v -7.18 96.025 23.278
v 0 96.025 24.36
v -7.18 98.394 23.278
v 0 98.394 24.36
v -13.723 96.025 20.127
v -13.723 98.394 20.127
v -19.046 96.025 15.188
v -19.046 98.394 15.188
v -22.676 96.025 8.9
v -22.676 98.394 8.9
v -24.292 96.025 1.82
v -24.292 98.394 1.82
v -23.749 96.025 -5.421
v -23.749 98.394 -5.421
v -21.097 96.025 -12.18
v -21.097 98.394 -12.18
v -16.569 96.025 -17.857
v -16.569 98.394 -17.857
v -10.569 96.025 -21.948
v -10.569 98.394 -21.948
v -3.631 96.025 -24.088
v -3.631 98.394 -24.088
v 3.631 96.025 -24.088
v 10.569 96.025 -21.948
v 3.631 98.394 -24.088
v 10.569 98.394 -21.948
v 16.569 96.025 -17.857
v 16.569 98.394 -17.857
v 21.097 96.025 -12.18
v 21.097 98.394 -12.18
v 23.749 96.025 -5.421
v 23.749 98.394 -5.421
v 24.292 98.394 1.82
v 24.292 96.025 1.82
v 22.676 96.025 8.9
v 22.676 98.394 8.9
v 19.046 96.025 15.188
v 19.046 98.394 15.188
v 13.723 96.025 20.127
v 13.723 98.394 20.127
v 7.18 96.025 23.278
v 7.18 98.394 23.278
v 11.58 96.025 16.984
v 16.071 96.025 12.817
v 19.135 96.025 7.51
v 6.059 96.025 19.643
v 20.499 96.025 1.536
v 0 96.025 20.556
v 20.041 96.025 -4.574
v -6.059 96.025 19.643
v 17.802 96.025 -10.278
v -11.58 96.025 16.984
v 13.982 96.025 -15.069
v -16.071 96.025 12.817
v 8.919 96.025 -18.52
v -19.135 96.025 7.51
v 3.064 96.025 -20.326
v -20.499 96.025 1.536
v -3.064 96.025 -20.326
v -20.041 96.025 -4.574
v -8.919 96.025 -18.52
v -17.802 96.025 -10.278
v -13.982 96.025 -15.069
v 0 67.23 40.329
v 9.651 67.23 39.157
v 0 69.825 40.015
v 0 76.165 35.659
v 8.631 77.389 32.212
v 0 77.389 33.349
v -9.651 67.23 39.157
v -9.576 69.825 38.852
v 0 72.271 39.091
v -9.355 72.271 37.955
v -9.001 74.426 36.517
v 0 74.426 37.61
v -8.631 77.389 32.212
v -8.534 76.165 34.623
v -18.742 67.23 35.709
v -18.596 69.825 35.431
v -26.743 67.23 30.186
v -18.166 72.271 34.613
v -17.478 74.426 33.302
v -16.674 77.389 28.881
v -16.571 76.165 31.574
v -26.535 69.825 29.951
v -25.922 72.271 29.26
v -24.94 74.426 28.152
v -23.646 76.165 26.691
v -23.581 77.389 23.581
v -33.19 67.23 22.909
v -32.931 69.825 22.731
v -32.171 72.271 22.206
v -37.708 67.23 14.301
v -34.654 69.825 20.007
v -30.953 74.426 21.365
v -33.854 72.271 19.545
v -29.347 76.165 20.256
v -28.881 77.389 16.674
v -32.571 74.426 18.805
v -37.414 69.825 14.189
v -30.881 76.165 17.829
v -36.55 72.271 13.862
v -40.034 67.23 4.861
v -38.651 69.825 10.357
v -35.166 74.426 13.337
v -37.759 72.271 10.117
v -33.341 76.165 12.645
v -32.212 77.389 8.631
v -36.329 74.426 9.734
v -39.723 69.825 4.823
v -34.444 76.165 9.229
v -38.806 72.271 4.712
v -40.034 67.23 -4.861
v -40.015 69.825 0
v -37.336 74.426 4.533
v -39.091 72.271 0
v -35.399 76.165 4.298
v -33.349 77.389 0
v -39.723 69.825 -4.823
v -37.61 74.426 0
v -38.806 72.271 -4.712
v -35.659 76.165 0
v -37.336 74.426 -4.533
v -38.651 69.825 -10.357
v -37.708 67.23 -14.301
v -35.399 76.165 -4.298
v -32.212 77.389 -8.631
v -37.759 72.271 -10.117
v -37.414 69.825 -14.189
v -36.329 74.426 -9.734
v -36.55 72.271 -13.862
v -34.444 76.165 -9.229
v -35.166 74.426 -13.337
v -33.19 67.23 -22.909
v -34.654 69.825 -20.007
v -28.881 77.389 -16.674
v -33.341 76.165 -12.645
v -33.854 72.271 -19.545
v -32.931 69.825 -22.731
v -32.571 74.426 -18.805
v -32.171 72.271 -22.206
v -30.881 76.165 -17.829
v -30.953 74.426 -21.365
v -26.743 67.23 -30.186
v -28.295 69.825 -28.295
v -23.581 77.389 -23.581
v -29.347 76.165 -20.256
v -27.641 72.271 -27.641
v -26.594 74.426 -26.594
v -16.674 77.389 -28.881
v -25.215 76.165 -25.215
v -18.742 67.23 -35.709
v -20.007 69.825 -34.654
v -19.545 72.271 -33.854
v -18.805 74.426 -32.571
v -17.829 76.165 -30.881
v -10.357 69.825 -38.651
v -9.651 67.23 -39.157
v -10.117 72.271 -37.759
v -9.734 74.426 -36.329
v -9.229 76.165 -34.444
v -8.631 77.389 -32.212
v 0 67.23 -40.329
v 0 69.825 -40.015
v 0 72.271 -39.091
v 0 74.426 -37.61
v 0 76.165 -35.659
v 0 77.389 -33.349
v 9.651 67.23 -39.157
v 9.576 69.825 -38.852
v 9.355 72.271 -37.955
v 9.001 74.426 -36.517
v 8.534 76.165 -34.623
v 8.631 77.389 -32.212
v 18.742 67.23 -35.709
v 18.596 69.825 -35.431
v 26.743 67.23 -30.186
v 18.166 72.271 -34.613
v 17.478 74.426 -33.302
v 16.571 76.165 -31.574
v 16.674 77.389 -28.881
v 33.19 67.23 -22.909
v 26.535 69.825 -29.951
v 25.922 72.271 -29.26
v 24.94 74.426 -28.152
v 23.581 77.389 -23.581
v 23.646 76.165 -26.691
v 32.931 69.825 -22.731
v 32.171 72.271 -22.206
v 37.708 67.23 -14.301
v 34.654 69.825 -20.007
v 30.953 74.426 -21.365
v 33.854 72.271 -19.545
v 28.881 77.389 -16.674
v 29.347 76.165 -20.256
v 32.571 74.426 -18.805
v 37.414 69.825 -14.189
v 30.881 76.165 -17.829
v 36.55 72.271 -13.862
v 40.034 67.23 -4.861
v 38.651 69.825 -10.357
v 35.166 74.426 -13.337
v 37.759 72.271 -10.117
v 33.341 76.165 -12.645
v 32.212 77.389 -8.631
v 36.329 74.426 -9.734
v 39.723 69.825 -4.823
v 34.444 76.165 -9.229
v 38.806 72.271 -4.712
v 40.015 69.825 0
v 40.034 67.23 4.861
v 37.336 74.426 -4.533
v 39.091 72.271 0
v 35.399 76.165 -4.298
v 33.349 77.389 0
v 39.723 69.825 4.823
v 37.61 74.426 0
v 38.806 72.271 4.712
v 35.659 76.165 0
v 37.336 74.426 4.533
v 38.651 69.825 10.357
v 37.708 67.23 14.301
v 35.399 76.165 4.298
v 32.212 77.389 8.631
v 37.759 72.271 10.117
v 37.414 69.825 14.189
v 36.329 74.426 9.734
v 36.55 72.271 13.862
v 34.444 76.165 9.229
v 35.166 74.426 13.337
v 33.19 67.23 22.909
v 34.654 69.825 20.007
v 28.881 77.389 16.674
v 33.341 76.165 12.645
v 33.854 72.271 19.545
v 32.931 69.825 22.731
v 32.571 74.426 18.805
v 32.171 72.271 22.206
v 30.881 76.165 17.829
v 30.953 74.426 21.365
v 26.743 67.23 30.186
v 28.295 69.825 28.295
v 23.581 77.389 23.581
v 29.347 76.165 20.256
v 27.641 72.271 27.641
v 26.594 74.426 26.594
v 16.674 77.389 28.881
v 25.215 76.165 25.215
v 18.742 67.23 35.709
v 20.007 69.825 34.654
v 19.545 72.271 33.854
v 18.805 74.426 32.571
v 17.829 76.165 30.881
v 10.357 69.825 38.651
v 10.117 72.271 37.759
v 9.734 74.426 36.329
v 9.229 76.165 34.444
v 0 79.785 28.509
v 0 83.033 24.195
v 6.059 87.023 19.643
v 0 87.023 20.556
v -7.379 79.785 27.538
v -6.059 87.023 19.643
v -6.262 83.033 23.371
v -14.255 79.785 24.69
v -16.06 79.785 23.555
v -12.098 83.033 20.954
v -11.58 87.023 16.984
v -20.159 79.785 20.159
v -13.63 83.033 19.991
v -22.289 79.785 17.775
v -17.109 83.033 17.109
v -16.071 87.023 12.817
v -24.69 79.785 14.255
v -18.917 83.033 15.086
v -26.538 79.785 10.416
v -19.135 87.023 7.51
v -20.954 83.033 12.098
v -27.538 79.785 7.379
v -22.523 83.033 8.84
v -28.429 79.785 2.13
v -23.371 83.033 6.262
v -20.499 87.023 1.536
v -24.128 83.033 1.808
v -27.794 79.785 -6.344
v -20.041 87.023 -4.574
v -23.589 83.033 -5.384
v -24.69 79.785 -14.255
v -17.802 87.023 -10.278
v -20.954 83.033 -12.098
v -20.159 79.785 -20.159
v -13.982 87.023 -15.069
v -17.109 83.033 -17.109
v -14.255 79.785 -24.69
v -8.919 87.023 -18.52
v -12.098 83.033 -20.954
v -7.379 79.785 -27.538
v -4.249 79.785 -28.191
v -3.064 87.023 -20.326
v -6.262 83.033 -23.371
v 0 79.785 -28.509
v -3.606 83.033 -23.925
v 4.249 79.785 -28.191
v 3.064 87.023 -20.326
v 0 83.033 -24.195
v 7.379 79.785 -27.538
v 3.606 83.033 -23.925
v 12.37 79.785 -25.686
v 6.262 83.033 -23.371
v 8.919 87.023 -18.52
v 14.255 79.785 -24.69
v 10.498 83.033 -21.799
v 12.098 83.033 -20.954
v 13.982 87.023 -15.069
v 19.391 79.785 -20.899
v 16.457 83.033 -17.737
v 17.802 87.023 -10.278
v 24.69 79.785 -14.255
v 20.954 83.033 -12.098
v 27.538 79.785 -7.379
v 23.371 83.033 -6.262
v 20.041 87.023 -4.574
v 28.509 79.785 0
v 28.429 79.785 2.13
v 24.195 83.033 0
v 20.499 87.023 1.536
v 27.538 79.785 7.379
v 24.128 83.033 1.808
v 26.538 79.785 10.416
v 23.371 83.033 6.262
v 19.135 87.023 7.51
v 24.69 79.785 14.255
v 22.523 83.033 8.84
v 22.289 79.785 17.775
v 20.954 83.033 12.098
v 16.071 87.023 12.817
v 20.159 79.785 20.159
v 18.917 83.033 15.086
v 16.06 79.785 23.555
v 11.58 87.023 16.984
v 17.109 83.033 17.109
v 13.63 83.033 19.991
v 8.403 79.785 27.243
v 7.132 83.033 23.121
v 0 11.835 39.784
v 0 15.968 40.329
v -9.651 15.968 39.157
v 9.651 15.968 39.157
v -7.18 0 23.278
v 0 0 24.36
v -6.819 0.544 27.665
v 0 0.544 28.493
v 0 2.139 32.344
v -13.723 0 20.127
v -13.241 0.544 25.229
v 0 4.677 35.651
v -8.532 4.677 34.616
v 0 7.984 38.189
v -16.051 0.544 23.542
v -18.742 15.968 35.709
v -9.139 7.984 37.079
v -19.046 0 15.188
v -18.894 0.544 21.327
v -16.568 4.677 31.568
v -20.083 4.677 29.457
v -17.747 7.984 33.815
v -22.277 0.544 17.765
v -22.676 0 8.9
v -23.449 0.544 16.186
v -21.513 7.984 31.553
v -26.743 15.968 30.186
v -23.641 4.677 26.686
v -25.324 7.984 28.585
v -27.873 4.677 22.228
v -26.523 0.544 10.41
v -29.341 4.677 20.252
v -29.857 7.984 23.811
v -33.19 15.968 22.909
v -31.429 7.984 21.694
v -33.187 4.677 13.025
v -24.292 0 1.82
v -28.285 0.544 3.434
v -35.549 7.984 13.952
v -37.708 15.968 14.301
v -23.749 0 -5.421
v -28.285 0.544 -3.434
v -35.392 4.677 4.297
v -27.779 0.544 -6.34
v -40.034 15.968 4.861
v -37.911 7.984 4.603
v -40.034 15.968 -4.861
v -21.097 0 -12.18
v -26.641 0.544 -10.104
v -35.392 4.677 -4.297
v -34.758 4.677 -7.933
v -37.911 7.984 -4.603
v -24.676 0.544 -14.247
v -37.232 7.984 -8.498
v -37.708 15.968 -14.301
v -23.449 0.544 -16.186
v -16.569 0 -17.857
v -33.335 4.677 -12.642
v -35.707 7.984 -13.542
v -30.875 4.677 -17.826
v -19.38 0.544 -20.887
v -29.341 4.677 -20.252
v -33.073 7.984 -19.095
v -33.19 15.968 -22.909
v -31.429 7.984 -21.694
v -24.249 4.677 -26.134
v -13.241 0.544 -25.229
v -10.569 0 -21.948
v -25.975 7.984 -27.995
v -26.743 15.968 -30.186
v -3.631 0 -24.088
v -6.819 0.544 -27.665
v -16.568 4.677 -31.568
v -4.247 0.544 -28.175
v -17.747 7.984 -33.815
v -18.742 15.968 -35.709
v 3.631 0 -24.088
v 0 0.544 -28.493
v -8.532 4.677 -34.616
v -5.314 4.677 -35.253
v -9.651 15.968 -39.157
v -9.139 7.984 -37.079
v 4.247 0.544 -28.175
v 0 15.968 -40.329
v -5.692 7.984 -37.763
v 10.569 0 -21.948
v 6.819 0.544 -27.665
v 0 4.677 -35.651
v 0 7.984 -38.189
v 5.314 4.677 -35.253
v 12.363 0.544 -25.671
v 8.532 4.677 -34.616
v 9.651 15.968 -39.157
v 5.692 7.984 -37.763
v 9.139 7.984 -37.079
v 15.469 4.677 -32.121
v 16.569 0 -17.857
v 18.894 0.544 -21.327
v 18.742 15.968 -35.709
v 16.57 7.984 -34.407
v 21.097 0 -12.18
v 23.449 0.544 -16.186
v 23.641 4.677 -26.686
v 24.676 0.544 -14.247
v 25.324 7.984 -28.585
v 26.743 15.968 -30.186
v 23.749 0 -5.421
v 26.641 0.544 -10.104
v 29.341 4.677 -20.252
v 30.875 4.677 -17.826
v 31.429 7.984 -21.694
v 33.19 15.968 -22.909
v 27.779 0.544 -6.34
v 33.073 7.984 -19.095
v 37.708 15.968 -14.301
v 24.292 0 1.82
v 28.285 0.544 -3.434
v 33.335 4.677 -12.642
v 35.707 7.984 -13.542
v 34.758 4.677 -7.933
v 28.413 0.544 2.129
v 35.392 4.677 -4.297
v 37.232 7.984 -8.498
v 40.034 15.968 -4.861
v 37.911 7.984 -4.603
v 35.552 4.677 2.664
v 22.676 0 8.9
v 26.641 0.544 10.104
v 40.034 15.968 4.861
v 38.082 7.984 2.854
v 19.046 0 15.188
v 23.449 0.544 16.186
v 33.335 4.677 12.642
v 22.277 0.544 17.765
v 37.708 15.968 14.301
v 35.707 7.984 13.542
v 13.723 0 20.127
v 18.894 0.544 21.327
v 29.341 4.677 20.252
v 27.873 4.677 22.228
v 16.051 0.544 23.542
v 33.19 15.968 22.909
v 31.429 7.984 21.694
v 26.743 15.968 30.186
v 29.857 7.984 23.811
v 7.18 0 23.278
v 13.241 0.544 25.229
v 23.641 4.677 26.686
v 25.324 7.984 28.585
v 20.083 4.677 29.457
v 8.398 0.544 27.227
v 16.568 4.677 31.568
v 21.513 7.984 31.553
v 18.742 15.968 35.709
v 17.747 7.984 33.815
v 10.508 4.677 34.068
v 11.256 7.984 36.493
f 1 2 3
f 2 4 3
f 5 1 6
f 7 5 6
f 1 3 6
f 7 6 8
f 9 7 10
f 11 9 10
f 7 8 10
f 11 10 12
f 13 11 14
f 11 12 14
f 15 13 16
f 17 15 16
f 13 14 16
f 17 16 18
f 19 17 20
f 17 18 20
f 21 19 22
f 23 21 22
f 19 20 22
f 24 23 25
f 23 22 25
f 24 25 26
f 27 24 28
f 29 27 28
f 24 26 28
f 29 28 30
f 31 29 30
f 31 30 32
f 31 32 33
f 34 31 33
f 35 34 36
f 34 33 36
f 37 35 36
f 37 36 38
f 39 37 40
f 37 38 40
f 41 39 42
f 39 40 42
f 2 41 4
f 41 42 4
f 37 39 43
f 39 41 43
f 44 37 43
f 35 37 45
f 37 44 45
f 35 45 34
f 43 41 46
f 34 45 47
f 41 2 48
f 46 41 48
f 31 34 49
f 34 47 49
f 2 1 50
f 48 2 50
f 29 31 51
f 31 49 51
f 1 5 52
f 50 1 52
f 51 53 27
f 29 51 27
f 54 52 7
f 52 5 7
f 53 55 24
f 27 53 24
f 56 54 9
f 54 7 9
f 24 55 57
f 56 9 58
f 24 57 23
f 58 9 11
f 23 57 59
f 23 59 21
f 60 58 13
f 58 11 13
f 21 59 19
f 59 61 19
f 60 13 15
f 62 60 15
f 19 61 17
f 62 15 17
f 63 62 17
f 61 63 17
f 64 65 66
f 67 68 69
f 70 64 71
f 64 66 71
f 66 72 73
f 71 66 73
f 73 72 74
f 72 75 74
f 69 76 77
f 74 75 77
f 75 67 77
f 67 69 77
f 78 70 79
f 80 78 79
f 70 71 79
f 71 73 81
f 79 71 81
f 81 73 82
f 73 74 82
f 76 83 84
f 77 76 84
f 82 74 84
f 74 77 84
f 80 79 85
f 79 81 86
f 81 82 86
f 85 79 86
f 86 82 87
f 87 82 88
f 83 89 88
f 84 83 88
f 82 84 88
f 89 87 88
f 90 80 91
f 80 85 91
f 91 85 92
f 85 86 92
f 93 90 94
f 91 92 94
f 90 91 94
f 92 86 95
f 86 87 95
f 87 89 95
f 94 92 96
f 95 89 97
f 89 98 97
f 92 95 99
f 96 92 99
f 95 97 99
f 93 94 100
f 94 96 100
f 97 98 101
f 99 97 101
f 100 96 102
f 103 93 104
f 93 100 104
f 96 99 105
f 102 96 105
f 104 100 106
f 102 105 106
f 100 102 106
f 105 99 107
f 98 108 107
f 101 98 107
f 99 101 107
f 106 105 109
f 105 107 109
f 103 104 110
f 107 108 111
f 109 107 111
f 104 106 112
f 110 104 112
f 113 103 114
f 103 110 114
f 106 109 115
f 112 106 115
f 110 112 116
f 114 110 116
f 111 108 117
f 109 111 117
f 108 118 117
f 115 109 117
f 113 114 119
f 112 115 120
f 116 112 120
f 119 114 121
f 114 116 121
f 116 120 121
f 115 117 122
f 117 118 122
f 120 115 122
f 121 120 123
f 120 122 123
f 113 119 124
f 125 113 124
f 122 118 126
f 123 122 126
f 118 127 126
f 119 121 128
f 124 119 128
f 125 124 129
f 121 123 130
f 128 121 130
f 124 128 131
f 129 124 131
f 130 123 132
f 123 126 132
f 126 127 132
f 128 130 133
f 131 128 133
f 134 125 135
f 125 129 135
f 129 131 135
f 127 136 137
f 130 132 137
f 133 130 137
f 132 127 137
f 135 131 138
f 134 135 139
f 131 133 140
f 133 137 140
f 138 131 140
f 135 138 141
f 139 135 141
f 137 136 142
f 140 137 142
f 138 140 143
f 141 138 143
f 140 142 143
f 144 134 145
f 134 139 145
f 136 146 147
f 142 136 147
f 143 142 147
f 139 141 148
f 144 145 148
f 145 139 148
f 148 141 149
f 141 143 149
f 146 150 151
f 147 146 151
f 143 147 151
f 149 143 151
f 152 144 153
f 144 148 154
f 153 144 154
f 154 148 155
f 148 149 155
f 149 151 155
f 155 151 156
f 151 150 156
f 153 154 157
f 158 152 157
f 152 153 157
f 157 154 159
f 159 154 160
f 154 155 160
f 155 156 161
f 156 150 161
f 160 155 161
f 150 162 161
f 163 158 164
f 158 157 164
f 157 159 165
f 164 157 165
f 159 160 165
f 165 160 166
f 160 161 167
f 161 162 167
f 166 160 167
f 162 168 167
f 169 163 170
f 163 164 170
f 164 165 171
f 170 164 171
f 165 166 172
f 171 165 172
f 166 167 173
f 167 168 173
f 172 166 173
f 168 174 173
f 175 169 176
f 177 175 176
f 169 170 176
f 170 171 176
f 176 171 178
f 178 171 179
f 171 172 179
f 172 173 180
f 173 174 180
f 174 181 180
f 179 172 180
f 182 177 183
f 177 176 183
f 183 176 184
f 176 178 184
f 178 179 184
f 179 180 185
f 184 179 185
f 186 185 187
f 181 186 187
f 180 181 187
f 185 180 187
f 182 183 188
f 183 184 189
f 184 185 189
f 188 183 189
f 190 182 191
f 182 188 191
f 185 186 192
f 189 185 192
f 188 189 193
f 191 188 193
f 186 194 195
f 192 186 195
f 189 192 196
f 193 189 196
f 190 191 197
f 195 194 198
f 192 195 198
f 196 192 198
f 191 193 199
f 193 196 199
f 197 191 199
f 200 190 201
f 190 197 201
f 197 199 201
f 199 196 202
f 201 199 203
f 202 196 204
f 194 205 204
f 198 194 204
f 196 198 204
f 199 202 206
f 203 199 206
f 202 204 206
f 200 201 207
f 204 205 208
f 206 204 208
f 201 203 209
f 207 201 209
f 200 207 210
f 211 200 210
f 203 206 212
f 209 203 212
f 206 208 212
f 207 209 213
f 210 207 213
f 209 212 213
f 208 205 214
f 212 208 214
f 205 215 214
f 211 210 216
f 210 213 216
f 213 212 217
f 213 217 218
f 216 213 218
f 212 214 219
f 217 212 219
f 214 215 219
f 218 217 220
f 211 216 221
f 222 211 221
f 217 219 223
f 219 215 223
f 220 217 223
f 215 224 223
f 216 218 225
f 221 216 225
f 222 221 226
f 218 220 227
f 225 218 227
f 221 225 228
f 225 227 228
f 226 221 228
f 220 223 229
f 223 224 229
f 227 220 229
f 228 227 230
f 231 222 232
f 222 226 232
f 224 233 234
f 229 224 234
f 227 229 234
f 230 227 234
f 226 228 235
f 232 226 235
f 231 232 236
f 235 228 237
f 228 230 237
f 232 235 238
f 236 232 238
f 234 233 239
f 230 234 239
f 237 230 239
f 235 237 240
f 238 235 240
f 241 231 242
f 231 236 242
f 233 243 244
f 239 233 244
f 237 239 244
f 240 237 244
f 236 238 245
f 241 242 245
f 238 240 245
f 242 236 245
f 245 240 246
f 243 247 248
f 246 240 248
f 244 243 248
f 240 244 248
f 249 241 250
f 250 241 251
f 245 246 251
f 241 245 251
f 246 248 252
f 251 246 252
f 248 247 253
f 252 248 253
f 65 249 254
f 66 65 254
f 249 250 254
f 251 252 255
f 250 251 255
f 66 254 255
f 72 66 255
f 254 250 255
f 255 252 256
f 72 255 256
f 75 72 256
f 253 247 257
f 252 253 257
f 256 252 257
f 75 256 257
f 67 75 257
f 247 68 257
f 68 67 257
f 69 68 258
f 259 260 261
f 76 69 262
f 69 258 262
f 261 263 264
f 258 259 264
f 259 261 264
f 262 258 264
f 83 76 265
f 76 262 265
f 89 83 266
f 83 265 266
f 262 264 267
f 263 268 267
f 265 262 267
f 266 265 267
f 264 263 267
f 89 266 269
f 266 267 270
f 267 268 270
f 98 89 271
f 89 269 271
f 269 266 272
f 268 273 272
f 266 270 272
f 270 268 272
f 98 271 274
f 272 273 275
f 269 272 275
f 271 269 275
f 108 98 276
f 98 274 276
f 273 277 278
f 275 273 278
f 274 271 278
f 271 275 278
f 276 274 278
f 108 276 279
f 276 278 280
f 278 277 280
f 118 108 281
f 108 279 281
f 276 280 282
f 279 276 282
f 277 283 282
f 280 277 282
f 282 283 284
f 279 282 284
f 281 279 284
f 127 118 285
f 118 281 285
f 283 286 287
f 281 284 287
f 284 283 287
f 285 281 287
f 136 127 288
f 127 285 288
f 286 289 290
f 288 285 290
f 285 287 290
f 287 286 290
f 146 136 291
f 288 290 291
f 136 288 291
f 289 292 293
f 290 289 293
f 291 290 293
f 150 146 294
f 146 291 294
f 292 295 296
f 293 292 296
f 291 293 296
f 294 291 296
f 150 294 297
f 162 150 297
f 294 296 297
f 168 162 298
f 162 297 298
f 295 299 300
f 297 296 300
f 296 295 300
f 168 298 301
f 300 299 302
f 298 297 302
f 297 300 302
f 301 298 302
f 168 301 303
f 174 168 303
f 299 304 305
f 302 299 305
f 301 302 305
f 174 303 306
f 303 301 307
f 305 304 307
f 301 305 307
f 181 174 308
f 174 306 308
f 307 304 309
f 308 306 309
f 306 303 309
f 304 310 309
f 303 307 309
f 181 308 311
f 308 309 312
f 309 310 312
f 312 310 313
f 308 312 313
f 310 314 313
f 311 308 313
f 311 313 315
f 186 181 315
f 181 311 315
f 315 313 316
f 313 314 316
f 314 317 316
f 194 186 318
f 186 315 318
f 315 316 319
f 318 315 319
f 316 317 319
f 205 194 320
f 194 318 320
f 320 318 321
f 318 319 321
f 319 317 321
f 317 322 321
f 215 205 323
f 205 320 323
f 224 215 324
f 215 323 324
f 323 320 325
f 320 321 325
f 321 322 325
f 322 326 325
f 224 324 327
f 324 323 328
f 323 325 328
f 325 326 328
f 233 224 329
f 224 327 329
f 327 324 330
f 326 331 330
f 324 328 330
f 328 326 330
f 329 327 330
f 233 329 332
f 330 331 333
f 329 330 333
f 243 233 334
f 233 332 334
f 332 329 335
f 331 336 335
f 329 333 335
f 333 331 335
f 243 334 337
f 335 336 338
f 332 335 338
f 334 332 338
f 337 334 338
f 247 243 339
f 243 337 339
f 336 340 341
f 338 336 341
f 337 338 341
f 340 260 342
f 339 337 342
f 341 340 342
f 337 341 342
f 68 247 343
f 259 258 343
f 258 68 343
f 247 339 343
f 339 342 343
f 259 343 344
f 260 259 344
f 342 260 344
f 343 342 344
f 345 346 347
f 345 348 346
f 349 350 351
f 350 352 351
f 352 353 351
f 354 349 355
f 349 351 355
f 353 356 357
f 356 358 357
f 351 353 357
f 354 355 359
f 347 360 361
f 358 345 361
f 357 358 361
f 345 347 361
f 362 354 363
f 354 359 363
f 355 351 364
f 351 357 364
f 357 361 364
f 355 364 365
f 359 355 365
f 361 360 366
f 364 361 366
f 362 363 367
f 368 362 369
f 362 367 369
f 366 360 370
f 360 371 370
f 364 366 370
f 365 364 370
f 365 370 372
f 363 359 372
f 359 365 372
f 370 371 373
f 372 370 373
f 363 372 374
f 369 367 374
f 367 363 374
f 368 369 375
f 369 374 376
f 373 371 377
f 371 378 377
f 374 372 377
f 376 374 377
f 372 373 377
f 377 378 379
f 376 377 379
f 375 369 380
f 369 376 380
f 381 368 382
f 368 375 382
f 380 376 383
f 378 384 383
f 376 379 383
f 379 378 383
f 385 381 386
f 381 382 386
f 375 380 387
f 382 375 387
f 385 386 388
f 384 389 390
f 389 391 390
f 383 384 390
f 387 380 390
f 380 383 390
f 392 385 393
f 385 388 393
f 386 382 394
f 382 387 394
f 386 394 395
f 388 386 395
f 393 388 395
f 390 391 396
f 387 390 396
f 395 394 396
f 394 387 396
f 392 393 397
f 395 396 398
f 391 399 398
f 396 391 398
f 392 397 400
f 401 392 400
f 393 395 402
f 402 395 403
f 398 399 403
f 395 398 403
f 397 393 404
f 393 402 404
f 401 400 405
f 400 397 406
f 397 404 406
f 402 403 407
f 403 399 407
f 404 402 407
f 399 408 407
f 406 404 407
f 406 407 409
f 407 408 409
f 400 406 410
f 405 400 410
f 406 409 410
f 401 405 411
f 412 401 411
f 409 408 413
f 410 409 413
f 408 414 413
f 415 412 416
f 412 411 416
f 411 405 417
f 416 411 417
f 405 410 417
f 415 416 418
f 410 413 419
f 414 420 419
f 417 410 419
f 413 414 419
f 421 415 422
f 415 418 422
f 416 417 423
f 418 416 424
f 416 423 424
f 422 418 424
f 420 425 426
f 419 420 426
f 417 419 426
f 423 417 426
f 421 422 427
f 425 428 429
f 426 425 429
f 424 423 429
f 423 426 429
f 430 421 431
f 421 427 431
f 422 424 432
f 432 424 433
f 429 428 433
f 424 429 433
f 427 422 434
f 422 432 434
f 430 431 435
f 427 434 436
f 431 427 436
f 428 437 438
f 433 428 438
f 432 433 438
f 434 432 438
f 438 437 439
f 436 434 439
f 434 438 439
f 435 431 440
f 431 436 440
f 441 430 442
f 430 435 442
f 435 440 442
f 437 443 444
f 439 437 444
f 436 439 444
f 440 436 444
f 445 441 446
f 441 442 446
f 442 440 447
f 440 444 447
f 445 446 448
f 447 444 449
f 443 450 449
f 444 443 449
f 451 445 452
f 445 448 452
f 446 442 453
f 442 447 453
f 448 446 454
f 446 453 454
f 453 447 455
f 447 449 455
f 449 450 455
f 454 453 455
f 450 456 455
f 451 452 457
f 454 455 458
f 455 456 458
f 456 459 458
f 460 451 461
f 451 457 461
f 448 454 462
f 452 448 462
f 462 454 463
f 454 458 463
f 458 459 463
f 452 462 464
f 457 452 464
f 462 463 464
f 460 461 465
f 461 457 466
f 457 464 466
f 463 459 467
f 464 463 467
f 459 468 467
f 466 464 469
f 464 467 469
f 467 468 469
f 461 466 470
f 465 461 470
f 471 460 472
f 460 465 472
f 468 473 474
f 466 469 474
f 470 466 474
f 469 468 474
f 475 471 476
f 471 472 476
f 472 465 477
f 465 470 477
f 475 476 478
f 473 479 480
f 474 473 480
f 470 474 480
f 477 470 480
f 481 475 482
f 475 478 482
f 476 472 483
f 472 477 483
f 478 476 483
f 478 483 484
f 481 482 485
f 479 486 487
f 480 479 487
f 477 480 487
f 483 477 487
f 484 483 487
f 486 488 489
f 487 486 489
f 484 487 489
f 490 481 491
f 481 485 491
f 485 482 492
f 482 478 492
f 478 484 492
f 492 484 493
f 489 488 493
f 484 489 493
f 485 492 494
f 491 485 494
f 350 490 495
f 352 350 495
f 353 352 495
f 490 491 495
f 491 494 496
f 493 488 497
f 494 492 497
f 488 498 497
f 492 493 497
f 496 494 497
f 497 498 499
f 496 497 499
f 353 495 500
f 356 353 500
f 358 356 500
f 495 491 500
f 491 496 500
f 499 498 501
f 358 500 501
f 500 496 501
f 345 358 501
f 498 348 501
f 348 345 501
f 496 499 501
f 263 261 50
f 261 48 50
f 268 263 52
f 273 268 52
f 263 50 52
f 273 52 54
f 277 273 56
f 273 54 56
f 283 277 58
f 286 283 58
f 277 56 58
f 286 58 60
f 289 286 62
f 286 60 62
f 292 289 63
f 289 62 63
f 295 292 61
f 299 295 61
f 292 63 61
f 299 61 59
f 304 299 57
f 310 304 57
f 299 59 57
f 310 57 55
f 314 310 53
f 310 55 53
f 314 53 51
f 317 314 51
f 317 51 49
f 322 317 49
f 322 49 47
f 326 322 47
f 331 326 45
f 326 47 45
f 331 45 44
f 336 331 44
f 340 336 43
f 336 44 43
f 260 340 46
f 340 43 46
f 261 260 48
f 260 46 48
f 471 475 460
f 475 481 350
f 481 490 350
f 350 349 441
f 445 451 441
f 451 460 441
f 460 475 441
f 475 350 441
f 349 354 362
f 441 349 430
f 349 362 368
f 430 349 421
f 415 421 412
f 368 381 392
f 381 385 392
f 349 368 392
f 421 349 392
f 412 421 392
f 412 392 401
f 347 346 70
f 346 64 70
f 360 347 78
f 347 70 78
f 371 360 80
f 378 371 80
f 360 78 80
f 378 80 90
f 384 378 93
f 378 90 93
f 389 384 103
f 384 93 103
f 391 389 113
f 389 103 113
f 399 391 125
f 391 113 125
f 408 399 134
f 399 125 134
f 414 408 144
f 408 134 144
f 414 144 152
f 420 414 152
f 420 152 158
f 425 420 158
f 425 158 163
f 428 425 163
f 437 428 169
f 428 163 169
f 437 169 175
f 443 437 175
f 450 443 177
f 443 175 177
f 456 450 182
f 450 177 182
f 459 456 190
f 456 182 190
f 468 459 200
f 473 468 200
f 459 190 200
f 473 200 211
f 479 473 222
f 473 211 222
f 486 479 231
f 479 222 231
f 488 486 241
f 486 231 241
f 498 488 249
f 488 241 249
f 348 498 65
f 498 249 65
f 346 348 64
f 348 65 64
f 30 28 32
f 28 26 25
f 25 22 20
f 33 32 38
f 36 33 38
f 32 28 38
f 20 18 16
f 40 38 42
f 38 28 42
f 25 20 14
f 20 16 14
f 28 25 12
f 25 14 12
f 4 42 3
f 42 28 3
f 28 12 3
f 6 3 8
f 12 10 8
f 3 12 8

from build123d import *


with BuildPart() as part:
    # Sketch1 → Revolve1 (revolve)
    with BuildSketch(Plane.XY, mode=Mode.PRIVATE) as revolve1_sk:
        with BuildLine():
            Line((0, 0), (24.360145845, 0))
            ThreePointArc((24.360145845, 0), (35.651483834, 4.677025332), (40.328509165, 15.96836332))
            Line((40.328509165, 15.96836332), (40.328509165, 67.23016629))
            ThreePointArc((40.328509165, 67.23016629), (38.415383352, 73.392914659), (33.348649325, 77.388878138))
            ThreePointArc((33.348649325, 77.388878138), (26.276782154, 81.308753559), (20.55607493, 87.022792188))
            Line((20.55607493, 87.022792188), (20.55607493, 96.024974169))
            Line((20.55607493, 96.024974169), (24.360145845, 96.024974169))
            Line((24.360145845, 96.024974169), (24.360145845, 98.393969428))
            Line((24.360145845, 98.393969428), (0, 98.393969428))
            Line((0, 98.393969428), (0, 0))
        make_face()
    revolve(revolve1_sk.sketch.rotate(Axis((0, 98.393969428, 0), (0, -1, 0)), 90), axis=Axis((0, 98.393969428, 0), (0, -1, 0)))


solid = part.part
